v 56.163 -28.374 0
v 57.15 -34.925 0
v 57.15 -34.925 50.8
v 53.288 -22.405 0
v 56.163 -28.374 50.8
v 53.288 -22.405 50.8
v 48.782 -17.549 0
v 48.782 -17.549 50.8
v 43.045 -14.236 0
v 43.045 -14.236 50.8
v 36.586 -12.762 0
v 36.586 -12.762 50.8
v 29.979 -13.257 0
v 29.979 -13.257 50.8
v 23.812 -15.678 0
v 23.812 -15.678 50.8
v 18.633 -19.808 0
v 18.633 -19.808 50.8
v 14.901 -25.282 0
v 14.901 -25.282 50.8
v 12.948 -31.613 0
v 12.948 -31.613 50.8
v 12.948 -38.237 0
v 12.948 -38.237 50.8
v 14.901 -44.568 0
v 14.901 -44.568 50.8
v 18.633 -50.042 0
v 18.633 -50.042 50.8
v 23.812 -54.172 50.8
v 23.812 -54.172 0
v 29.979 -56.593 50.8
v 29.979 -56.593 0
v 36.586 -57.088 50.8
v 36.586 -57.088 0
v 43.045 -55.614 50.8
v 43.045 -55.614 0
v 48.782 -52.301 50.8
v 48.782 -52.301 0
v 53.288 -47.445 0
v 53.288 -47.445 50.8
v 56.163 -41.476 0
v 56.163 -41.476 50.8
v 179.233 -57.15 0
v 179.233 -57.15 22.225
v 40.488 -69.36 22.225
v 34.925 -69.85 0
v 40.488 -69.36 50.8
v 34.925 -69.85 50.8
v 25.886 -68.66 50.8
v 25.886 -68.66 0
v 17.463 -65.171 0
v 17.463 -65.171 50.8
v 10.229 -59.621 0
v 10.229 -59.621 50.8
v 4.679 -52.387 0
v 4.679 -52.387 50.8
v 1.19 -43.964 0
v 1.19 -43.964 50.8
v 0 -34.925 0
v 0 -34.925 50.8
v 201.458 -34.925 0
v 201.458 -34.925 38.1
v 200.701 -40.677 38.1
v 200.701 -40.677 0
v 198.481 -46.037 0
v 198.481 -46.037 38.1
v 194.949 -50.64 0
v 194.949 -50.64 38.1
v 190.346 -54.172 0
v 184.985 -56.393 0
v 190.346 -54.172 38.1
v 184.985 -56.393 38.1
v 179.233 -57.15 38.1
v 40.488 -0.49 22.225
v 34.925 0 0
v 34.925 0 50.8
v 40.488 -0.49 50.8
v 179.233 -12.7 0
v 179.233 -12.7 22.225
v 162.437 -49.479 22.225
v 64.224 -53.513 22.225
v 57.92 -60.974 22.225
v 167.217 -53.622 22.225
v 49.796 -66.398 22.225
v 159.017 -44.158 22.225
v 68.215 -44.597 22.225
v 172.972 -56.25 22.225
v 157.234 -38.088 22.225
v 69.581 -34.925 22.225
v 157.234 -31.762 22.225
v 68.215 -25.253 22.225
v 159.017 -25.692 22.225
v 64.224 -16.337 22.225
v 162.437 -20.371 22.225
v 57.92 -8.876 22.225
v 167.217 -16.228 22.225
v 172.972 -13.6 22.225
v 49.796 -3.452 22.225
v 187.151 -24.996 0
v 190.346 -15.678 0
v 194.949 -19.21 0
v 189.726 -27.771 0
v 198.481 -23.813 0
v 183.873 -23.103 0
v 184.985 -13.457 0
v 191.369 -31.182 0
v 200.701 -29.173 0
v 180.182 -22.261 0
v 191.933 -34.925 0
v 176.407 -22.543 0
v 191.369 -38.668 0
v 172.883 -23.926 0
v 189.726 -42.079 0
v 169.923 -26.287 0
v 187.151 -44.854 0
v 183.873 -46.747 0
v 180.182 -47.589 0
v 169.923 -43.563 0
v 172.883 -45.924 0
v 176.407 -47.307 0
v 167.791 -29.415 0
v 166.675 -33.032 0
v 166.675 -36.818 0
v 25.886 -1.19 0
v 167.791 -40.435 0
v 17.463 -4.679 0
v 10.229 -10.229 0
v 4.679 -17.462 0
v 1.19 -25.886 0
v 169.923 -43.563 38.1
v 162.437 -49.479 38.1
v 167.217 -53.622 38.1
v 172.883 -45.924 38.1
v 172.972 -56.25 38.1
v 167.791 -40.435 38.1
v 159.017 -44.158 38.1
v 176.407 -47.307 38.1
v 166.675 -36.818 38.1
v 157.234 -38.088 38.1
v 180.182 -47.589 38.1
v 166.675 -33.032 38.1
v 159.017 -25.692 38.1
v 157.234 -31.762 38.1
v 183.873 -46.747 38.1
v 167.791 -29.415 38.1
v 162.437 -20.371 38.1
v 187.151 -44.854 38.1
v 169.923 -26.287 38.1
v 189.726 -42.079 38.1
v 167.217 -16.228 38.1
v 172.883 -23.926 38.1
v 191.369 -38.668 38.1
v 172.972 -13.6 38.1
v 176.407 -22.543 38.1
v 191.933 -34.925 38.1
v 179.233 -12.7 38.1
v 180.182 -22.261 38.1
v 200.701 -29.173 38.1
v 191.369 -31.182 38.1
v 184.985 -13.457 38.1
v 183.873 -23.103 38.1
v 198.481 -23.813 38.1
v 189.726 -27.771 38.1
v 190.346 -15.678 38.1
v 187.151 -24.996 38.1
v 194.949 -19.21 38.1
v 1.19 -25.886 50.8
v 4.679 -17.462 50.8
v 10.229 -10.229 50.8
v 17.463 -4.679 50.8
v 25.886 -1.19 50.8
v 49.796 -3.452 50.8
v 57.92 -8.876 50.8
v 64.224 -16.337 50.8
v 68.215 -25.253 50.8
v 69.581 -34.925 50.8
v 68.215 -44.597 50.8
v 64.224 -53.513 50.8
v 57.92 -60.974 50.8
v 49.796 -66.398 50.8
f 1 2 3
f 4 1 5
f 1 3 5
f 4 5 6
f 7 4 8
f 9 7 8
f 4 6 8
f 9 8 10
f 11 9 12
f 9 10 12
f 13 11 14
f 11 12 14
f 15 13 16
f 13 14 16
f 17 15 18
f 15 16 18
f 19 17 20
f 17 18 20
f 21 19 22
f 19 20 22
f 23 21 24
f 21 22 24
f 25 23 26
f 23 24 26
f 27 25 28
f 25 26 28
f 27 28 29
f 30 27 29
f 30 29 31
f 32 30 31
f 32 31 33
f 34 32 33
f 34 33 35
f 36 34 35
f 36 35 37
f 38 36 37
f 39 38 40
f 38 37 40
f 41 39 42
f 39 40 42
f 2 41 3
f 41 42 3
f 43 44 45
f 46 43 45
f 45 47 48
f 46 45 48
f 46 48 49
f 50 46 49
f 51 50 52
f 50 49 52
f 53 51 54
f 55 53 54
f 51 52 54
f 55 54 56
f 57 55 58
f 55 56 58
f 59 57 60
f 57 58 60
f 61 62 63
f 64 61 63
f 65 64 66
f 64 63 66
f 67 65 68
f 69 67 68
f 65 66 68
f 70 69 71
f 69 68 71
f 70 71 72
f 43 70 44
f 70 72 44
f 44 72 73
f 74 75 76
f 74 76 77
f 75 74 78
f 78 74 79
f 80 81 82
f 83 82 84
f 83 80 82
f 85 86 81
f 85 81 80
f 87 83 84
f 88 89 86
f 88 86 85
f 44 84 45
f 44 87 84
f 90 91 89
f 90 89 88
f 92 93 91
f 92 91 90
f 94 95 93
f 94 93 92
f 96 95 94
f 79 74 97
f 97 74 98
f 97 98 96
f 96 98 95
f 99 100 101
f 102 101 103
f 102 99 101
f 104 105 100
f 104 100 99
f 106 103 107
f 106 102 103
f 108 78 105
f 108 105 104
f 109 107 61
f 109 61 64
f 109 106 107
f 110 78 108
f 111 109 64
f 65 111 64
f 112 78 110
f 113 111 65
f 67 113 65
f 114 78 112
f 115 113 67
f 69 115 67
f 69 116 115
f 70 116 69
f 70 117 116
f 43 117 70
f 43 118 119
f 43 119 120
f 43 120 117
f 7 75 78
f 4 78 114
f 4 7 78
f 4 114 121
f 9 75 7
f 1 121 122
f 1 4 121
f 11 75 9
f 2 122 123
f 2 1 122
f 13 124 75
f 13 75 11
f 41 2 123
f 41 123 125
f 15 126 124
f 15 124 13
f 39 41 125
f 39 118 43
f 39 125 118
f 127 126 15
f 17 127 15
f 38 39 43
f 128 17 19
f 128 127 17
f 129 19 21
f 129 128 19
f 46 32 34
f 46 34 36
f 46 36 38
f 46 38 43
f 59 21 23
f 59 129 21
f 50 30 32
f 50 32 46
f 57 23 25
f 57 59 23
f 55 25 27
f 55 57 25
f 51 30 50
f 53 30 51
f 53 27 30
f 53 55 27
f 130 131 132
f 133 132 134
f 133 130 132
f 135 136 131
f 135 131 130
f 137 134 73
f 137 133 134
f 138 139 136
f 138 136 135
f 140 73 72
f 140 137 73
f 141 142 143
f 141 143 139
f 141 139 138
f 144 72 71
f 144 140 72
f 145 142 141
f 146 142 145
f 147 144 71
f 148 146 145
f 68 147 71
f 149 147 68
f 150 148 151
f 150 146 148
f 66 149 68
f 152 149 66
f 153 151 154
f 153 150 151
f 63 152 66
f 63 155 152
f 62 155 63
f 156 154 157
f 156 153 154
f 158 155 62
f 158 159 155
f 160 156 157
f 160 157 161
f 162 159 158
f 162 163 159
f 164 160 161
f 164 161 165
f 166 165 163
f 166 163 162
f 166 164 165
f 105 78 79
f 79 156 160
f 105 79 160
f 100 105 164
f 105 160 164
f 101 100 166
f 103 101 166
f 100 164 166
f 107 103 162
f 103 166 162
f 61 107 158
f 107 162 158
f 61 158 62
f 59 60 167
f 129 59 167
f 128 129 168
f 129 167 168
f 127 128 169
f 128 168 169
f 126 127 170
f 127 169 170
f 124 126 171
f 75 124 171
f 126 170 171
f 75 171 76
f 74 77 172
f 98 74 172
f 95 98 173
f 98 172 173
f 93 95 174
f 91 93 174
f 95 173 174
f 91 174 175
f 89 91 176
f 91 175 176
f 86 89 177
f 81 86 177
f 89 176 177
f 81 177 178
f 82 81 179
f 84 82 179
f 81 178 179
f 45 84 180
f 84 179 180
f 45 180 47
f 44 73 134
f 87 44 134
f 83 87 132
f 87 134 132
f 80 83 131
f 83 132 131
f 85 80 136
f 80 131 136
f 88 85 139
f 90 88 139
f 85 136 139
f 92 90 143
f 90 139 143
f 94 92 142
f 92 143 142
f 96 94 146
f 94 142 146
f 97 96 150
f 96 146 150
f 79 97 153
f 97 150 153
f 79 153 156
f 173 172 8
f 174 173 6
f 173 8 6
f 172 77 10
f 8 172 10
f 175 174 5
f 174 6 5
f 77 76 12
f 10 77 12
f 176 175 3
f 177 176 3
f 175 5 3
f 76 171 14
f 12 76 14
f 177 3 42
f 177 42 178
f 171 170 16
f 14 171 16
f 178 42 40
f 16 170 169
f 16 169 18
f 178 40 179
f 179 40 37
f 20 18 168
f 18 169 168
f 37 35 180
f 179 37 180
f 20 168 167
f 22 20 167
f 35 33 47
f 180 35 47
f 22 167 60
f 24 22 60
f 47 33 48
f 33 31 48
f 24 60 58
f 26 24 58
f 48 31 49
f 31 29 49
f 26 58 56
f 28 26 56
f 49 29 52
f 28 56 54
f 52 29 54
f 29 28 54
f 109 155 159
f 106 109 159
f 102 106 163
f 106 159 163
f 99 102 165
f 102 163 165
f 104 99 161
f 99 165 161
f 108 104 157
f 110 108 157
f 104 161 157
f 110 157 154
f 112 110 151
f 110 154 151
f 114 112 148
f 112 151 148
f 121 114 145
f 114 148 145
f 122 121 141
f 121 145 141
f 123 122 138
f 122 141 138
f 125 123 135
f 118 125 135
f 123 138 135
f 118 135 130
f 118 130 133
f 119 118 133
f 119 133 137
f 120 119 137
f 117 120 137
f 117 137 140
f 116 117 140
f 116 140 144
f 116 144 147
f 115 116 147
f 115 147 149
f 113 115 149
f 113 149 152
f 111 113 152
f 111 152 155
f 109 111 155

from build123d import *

# Parameters (mm, degrees)
F0_W      = 177.8
F0_H      = 50.8
F1_DEPTH  = 69.85
F3_DEPTH  = 50.8
F2_R      = 22.225
F4_DEPTH  = 50.8
F5_DEPTH  = 50.8
F7_DEPTH  = 50.8
F6_R      = 12.7
F8_DEPTH  = 50.8
F10_DEPTH = 50.8
F12_DEPTH = 28.575
F13_R     = 22.225
F14_DEPTH = 12.7


# Not quite as in the source:
# - ends of sketch curves that miss each other by under 0.0002 mm in the source are joined


with BuildPart() as f1:
    # F0 (on Front) → F1 (new body)
    with BuildSketch(Plane.XZ):
        with Locations((88.9, 25.4)):
            Rectangle(F0_W, F0_H)
    extrude(amount=F1_DEPTH)

    # F2 (on face) → F3 (cut, through all)
    with BuildSketch(Plane.XY.offset(50.8)):
        with BuildLine():
            Line((0, -69.85), (34.925, -69.85))
            ThreePointArc((34.925, -69.85), (10.2292956671, -59.6207043329), (0, -34.925))
            Line((0, -34.925), (0, -69.85))
        make_face()
        with BuildLine():
            ThreePointArc((0, -34.925), (10.2292957417, -10.2292955924), (34.9250002112, 0))
            Line((34.9250002112, 0), (0, 0))
            Line((0, 0), (0, -34.925))
        make_face()
    extrude(amount=-F3_DEPTH, mode=Mode.SUBTRACT)

    # F2 (on face) → F4 (cut, through all)
    with BuildSketch(Plane.XY.offset(50.8)):
        with Locations((34.925, -34.925)):
            Circle(F2_R)
    extrude(amount=-F4_DEPTH, mode=Mode.SUBTRACT)

    # F5 (add): a face of the model
    f5_faces = [f1.faces().sort_by_distance(p)[0] for p in [
        (177.8, -34.925, 25.4),
    ]]
    extrude(f5_faces, amount=F5_DEPTH)

    # F6 (on face) → F7 (cut, through all)
    with BuildSketch(Plane.XY.offset(50.8)):
        with BuildLine():
            Line((228.6, 0), (34.9250002112, 0))
            Line((34.9250002112, 0), (180.975, -10.3535739202))
            ThreePointArc((180.975, -10.3535739202), (203.8662068568, -34.925), (180.975, -59.4964260798))
            Line((180.975, -59.4964260798), (34.925, -69.85))
            Line((34.925, -69.85), (228.6, -69.85))
            Line((228.6, -69.85), (228.6, 0))
        make_face()
    extrude(amount=-F7_DEPTH, mode=Mode.SUBTRACT)

    # F6 (on face) → F8 (cut, through all)
    with BuildSketch(Plane.XY.offset(50.8)):
        with Locations((179.2331165612, -34.925)):
            Circle(F6_R)
    extrude(amount=-F8_DEPTH, mode=Mode.SUBTRACT)

    # F9 (on face) → F10 (cut, through all)
    with BuildSketch(Plane.XY.offset(50.8)):
        with BuildLine():
            ThreePointArc((179.2331165612, -12.7), (194.948564773, -19.2095517881), (201.4581165612, -34.925))
            ThreePointArc((201.4581165612, -34.925), (194.948564773, -50.6404482119), (179.2331165612, -57.15))
            Line((179.2331165612, -57.15), (34.925, -69.85))
            Line((34.925, -69.85), (180.975, -59.4964260798))
            ThreePointArc((180.975, -59.4964260798), (203.8662068568, -34.925), (180.975, -10.3535739202))
            Line((180.975, -10.3535739202), (34.9250002112, 0))
            Line((34.9250002112, 0), (179.2331165612, -12.7))
        make_face()
    extrude(amount=-F10_DEPTH, mode=Mode.SUBTRACT)

    # F11 (on face) → F12 (cut)
    with BuildSketch(Plane.XY.offset(50.8)):
        with BuildLine():
            ThreePointArc((40.4881105931, -0.4895878599), (69.5805320507, -34.9249998886), (40.4881108127, -69.3604121029))
            Line((40.4881108127, -69.3604121029), (179.2331165612, -57.15))
            ThreePointArc((179.2331165612, -57.15), (157.0081165612, -34.925), (179.2331165612, -12.7))
            Line((179.2331165612, -12.7), (40.4881105931, -0.4895878599))
        make_face()
    extrude(amount=-F12_DEPTH, mode=Mode.SUBTRACT)

    # F13 (on face) → F14 (cut)
    with BuildSketch(Plane.XY.offset(50.8)):
        with Locations((179.2331165612, -34.925)):
            Circle(F13_R)
    extrude(amount=-F14_DEPTH, mode=Mode.SUBTRACT)


solid = f1.part
